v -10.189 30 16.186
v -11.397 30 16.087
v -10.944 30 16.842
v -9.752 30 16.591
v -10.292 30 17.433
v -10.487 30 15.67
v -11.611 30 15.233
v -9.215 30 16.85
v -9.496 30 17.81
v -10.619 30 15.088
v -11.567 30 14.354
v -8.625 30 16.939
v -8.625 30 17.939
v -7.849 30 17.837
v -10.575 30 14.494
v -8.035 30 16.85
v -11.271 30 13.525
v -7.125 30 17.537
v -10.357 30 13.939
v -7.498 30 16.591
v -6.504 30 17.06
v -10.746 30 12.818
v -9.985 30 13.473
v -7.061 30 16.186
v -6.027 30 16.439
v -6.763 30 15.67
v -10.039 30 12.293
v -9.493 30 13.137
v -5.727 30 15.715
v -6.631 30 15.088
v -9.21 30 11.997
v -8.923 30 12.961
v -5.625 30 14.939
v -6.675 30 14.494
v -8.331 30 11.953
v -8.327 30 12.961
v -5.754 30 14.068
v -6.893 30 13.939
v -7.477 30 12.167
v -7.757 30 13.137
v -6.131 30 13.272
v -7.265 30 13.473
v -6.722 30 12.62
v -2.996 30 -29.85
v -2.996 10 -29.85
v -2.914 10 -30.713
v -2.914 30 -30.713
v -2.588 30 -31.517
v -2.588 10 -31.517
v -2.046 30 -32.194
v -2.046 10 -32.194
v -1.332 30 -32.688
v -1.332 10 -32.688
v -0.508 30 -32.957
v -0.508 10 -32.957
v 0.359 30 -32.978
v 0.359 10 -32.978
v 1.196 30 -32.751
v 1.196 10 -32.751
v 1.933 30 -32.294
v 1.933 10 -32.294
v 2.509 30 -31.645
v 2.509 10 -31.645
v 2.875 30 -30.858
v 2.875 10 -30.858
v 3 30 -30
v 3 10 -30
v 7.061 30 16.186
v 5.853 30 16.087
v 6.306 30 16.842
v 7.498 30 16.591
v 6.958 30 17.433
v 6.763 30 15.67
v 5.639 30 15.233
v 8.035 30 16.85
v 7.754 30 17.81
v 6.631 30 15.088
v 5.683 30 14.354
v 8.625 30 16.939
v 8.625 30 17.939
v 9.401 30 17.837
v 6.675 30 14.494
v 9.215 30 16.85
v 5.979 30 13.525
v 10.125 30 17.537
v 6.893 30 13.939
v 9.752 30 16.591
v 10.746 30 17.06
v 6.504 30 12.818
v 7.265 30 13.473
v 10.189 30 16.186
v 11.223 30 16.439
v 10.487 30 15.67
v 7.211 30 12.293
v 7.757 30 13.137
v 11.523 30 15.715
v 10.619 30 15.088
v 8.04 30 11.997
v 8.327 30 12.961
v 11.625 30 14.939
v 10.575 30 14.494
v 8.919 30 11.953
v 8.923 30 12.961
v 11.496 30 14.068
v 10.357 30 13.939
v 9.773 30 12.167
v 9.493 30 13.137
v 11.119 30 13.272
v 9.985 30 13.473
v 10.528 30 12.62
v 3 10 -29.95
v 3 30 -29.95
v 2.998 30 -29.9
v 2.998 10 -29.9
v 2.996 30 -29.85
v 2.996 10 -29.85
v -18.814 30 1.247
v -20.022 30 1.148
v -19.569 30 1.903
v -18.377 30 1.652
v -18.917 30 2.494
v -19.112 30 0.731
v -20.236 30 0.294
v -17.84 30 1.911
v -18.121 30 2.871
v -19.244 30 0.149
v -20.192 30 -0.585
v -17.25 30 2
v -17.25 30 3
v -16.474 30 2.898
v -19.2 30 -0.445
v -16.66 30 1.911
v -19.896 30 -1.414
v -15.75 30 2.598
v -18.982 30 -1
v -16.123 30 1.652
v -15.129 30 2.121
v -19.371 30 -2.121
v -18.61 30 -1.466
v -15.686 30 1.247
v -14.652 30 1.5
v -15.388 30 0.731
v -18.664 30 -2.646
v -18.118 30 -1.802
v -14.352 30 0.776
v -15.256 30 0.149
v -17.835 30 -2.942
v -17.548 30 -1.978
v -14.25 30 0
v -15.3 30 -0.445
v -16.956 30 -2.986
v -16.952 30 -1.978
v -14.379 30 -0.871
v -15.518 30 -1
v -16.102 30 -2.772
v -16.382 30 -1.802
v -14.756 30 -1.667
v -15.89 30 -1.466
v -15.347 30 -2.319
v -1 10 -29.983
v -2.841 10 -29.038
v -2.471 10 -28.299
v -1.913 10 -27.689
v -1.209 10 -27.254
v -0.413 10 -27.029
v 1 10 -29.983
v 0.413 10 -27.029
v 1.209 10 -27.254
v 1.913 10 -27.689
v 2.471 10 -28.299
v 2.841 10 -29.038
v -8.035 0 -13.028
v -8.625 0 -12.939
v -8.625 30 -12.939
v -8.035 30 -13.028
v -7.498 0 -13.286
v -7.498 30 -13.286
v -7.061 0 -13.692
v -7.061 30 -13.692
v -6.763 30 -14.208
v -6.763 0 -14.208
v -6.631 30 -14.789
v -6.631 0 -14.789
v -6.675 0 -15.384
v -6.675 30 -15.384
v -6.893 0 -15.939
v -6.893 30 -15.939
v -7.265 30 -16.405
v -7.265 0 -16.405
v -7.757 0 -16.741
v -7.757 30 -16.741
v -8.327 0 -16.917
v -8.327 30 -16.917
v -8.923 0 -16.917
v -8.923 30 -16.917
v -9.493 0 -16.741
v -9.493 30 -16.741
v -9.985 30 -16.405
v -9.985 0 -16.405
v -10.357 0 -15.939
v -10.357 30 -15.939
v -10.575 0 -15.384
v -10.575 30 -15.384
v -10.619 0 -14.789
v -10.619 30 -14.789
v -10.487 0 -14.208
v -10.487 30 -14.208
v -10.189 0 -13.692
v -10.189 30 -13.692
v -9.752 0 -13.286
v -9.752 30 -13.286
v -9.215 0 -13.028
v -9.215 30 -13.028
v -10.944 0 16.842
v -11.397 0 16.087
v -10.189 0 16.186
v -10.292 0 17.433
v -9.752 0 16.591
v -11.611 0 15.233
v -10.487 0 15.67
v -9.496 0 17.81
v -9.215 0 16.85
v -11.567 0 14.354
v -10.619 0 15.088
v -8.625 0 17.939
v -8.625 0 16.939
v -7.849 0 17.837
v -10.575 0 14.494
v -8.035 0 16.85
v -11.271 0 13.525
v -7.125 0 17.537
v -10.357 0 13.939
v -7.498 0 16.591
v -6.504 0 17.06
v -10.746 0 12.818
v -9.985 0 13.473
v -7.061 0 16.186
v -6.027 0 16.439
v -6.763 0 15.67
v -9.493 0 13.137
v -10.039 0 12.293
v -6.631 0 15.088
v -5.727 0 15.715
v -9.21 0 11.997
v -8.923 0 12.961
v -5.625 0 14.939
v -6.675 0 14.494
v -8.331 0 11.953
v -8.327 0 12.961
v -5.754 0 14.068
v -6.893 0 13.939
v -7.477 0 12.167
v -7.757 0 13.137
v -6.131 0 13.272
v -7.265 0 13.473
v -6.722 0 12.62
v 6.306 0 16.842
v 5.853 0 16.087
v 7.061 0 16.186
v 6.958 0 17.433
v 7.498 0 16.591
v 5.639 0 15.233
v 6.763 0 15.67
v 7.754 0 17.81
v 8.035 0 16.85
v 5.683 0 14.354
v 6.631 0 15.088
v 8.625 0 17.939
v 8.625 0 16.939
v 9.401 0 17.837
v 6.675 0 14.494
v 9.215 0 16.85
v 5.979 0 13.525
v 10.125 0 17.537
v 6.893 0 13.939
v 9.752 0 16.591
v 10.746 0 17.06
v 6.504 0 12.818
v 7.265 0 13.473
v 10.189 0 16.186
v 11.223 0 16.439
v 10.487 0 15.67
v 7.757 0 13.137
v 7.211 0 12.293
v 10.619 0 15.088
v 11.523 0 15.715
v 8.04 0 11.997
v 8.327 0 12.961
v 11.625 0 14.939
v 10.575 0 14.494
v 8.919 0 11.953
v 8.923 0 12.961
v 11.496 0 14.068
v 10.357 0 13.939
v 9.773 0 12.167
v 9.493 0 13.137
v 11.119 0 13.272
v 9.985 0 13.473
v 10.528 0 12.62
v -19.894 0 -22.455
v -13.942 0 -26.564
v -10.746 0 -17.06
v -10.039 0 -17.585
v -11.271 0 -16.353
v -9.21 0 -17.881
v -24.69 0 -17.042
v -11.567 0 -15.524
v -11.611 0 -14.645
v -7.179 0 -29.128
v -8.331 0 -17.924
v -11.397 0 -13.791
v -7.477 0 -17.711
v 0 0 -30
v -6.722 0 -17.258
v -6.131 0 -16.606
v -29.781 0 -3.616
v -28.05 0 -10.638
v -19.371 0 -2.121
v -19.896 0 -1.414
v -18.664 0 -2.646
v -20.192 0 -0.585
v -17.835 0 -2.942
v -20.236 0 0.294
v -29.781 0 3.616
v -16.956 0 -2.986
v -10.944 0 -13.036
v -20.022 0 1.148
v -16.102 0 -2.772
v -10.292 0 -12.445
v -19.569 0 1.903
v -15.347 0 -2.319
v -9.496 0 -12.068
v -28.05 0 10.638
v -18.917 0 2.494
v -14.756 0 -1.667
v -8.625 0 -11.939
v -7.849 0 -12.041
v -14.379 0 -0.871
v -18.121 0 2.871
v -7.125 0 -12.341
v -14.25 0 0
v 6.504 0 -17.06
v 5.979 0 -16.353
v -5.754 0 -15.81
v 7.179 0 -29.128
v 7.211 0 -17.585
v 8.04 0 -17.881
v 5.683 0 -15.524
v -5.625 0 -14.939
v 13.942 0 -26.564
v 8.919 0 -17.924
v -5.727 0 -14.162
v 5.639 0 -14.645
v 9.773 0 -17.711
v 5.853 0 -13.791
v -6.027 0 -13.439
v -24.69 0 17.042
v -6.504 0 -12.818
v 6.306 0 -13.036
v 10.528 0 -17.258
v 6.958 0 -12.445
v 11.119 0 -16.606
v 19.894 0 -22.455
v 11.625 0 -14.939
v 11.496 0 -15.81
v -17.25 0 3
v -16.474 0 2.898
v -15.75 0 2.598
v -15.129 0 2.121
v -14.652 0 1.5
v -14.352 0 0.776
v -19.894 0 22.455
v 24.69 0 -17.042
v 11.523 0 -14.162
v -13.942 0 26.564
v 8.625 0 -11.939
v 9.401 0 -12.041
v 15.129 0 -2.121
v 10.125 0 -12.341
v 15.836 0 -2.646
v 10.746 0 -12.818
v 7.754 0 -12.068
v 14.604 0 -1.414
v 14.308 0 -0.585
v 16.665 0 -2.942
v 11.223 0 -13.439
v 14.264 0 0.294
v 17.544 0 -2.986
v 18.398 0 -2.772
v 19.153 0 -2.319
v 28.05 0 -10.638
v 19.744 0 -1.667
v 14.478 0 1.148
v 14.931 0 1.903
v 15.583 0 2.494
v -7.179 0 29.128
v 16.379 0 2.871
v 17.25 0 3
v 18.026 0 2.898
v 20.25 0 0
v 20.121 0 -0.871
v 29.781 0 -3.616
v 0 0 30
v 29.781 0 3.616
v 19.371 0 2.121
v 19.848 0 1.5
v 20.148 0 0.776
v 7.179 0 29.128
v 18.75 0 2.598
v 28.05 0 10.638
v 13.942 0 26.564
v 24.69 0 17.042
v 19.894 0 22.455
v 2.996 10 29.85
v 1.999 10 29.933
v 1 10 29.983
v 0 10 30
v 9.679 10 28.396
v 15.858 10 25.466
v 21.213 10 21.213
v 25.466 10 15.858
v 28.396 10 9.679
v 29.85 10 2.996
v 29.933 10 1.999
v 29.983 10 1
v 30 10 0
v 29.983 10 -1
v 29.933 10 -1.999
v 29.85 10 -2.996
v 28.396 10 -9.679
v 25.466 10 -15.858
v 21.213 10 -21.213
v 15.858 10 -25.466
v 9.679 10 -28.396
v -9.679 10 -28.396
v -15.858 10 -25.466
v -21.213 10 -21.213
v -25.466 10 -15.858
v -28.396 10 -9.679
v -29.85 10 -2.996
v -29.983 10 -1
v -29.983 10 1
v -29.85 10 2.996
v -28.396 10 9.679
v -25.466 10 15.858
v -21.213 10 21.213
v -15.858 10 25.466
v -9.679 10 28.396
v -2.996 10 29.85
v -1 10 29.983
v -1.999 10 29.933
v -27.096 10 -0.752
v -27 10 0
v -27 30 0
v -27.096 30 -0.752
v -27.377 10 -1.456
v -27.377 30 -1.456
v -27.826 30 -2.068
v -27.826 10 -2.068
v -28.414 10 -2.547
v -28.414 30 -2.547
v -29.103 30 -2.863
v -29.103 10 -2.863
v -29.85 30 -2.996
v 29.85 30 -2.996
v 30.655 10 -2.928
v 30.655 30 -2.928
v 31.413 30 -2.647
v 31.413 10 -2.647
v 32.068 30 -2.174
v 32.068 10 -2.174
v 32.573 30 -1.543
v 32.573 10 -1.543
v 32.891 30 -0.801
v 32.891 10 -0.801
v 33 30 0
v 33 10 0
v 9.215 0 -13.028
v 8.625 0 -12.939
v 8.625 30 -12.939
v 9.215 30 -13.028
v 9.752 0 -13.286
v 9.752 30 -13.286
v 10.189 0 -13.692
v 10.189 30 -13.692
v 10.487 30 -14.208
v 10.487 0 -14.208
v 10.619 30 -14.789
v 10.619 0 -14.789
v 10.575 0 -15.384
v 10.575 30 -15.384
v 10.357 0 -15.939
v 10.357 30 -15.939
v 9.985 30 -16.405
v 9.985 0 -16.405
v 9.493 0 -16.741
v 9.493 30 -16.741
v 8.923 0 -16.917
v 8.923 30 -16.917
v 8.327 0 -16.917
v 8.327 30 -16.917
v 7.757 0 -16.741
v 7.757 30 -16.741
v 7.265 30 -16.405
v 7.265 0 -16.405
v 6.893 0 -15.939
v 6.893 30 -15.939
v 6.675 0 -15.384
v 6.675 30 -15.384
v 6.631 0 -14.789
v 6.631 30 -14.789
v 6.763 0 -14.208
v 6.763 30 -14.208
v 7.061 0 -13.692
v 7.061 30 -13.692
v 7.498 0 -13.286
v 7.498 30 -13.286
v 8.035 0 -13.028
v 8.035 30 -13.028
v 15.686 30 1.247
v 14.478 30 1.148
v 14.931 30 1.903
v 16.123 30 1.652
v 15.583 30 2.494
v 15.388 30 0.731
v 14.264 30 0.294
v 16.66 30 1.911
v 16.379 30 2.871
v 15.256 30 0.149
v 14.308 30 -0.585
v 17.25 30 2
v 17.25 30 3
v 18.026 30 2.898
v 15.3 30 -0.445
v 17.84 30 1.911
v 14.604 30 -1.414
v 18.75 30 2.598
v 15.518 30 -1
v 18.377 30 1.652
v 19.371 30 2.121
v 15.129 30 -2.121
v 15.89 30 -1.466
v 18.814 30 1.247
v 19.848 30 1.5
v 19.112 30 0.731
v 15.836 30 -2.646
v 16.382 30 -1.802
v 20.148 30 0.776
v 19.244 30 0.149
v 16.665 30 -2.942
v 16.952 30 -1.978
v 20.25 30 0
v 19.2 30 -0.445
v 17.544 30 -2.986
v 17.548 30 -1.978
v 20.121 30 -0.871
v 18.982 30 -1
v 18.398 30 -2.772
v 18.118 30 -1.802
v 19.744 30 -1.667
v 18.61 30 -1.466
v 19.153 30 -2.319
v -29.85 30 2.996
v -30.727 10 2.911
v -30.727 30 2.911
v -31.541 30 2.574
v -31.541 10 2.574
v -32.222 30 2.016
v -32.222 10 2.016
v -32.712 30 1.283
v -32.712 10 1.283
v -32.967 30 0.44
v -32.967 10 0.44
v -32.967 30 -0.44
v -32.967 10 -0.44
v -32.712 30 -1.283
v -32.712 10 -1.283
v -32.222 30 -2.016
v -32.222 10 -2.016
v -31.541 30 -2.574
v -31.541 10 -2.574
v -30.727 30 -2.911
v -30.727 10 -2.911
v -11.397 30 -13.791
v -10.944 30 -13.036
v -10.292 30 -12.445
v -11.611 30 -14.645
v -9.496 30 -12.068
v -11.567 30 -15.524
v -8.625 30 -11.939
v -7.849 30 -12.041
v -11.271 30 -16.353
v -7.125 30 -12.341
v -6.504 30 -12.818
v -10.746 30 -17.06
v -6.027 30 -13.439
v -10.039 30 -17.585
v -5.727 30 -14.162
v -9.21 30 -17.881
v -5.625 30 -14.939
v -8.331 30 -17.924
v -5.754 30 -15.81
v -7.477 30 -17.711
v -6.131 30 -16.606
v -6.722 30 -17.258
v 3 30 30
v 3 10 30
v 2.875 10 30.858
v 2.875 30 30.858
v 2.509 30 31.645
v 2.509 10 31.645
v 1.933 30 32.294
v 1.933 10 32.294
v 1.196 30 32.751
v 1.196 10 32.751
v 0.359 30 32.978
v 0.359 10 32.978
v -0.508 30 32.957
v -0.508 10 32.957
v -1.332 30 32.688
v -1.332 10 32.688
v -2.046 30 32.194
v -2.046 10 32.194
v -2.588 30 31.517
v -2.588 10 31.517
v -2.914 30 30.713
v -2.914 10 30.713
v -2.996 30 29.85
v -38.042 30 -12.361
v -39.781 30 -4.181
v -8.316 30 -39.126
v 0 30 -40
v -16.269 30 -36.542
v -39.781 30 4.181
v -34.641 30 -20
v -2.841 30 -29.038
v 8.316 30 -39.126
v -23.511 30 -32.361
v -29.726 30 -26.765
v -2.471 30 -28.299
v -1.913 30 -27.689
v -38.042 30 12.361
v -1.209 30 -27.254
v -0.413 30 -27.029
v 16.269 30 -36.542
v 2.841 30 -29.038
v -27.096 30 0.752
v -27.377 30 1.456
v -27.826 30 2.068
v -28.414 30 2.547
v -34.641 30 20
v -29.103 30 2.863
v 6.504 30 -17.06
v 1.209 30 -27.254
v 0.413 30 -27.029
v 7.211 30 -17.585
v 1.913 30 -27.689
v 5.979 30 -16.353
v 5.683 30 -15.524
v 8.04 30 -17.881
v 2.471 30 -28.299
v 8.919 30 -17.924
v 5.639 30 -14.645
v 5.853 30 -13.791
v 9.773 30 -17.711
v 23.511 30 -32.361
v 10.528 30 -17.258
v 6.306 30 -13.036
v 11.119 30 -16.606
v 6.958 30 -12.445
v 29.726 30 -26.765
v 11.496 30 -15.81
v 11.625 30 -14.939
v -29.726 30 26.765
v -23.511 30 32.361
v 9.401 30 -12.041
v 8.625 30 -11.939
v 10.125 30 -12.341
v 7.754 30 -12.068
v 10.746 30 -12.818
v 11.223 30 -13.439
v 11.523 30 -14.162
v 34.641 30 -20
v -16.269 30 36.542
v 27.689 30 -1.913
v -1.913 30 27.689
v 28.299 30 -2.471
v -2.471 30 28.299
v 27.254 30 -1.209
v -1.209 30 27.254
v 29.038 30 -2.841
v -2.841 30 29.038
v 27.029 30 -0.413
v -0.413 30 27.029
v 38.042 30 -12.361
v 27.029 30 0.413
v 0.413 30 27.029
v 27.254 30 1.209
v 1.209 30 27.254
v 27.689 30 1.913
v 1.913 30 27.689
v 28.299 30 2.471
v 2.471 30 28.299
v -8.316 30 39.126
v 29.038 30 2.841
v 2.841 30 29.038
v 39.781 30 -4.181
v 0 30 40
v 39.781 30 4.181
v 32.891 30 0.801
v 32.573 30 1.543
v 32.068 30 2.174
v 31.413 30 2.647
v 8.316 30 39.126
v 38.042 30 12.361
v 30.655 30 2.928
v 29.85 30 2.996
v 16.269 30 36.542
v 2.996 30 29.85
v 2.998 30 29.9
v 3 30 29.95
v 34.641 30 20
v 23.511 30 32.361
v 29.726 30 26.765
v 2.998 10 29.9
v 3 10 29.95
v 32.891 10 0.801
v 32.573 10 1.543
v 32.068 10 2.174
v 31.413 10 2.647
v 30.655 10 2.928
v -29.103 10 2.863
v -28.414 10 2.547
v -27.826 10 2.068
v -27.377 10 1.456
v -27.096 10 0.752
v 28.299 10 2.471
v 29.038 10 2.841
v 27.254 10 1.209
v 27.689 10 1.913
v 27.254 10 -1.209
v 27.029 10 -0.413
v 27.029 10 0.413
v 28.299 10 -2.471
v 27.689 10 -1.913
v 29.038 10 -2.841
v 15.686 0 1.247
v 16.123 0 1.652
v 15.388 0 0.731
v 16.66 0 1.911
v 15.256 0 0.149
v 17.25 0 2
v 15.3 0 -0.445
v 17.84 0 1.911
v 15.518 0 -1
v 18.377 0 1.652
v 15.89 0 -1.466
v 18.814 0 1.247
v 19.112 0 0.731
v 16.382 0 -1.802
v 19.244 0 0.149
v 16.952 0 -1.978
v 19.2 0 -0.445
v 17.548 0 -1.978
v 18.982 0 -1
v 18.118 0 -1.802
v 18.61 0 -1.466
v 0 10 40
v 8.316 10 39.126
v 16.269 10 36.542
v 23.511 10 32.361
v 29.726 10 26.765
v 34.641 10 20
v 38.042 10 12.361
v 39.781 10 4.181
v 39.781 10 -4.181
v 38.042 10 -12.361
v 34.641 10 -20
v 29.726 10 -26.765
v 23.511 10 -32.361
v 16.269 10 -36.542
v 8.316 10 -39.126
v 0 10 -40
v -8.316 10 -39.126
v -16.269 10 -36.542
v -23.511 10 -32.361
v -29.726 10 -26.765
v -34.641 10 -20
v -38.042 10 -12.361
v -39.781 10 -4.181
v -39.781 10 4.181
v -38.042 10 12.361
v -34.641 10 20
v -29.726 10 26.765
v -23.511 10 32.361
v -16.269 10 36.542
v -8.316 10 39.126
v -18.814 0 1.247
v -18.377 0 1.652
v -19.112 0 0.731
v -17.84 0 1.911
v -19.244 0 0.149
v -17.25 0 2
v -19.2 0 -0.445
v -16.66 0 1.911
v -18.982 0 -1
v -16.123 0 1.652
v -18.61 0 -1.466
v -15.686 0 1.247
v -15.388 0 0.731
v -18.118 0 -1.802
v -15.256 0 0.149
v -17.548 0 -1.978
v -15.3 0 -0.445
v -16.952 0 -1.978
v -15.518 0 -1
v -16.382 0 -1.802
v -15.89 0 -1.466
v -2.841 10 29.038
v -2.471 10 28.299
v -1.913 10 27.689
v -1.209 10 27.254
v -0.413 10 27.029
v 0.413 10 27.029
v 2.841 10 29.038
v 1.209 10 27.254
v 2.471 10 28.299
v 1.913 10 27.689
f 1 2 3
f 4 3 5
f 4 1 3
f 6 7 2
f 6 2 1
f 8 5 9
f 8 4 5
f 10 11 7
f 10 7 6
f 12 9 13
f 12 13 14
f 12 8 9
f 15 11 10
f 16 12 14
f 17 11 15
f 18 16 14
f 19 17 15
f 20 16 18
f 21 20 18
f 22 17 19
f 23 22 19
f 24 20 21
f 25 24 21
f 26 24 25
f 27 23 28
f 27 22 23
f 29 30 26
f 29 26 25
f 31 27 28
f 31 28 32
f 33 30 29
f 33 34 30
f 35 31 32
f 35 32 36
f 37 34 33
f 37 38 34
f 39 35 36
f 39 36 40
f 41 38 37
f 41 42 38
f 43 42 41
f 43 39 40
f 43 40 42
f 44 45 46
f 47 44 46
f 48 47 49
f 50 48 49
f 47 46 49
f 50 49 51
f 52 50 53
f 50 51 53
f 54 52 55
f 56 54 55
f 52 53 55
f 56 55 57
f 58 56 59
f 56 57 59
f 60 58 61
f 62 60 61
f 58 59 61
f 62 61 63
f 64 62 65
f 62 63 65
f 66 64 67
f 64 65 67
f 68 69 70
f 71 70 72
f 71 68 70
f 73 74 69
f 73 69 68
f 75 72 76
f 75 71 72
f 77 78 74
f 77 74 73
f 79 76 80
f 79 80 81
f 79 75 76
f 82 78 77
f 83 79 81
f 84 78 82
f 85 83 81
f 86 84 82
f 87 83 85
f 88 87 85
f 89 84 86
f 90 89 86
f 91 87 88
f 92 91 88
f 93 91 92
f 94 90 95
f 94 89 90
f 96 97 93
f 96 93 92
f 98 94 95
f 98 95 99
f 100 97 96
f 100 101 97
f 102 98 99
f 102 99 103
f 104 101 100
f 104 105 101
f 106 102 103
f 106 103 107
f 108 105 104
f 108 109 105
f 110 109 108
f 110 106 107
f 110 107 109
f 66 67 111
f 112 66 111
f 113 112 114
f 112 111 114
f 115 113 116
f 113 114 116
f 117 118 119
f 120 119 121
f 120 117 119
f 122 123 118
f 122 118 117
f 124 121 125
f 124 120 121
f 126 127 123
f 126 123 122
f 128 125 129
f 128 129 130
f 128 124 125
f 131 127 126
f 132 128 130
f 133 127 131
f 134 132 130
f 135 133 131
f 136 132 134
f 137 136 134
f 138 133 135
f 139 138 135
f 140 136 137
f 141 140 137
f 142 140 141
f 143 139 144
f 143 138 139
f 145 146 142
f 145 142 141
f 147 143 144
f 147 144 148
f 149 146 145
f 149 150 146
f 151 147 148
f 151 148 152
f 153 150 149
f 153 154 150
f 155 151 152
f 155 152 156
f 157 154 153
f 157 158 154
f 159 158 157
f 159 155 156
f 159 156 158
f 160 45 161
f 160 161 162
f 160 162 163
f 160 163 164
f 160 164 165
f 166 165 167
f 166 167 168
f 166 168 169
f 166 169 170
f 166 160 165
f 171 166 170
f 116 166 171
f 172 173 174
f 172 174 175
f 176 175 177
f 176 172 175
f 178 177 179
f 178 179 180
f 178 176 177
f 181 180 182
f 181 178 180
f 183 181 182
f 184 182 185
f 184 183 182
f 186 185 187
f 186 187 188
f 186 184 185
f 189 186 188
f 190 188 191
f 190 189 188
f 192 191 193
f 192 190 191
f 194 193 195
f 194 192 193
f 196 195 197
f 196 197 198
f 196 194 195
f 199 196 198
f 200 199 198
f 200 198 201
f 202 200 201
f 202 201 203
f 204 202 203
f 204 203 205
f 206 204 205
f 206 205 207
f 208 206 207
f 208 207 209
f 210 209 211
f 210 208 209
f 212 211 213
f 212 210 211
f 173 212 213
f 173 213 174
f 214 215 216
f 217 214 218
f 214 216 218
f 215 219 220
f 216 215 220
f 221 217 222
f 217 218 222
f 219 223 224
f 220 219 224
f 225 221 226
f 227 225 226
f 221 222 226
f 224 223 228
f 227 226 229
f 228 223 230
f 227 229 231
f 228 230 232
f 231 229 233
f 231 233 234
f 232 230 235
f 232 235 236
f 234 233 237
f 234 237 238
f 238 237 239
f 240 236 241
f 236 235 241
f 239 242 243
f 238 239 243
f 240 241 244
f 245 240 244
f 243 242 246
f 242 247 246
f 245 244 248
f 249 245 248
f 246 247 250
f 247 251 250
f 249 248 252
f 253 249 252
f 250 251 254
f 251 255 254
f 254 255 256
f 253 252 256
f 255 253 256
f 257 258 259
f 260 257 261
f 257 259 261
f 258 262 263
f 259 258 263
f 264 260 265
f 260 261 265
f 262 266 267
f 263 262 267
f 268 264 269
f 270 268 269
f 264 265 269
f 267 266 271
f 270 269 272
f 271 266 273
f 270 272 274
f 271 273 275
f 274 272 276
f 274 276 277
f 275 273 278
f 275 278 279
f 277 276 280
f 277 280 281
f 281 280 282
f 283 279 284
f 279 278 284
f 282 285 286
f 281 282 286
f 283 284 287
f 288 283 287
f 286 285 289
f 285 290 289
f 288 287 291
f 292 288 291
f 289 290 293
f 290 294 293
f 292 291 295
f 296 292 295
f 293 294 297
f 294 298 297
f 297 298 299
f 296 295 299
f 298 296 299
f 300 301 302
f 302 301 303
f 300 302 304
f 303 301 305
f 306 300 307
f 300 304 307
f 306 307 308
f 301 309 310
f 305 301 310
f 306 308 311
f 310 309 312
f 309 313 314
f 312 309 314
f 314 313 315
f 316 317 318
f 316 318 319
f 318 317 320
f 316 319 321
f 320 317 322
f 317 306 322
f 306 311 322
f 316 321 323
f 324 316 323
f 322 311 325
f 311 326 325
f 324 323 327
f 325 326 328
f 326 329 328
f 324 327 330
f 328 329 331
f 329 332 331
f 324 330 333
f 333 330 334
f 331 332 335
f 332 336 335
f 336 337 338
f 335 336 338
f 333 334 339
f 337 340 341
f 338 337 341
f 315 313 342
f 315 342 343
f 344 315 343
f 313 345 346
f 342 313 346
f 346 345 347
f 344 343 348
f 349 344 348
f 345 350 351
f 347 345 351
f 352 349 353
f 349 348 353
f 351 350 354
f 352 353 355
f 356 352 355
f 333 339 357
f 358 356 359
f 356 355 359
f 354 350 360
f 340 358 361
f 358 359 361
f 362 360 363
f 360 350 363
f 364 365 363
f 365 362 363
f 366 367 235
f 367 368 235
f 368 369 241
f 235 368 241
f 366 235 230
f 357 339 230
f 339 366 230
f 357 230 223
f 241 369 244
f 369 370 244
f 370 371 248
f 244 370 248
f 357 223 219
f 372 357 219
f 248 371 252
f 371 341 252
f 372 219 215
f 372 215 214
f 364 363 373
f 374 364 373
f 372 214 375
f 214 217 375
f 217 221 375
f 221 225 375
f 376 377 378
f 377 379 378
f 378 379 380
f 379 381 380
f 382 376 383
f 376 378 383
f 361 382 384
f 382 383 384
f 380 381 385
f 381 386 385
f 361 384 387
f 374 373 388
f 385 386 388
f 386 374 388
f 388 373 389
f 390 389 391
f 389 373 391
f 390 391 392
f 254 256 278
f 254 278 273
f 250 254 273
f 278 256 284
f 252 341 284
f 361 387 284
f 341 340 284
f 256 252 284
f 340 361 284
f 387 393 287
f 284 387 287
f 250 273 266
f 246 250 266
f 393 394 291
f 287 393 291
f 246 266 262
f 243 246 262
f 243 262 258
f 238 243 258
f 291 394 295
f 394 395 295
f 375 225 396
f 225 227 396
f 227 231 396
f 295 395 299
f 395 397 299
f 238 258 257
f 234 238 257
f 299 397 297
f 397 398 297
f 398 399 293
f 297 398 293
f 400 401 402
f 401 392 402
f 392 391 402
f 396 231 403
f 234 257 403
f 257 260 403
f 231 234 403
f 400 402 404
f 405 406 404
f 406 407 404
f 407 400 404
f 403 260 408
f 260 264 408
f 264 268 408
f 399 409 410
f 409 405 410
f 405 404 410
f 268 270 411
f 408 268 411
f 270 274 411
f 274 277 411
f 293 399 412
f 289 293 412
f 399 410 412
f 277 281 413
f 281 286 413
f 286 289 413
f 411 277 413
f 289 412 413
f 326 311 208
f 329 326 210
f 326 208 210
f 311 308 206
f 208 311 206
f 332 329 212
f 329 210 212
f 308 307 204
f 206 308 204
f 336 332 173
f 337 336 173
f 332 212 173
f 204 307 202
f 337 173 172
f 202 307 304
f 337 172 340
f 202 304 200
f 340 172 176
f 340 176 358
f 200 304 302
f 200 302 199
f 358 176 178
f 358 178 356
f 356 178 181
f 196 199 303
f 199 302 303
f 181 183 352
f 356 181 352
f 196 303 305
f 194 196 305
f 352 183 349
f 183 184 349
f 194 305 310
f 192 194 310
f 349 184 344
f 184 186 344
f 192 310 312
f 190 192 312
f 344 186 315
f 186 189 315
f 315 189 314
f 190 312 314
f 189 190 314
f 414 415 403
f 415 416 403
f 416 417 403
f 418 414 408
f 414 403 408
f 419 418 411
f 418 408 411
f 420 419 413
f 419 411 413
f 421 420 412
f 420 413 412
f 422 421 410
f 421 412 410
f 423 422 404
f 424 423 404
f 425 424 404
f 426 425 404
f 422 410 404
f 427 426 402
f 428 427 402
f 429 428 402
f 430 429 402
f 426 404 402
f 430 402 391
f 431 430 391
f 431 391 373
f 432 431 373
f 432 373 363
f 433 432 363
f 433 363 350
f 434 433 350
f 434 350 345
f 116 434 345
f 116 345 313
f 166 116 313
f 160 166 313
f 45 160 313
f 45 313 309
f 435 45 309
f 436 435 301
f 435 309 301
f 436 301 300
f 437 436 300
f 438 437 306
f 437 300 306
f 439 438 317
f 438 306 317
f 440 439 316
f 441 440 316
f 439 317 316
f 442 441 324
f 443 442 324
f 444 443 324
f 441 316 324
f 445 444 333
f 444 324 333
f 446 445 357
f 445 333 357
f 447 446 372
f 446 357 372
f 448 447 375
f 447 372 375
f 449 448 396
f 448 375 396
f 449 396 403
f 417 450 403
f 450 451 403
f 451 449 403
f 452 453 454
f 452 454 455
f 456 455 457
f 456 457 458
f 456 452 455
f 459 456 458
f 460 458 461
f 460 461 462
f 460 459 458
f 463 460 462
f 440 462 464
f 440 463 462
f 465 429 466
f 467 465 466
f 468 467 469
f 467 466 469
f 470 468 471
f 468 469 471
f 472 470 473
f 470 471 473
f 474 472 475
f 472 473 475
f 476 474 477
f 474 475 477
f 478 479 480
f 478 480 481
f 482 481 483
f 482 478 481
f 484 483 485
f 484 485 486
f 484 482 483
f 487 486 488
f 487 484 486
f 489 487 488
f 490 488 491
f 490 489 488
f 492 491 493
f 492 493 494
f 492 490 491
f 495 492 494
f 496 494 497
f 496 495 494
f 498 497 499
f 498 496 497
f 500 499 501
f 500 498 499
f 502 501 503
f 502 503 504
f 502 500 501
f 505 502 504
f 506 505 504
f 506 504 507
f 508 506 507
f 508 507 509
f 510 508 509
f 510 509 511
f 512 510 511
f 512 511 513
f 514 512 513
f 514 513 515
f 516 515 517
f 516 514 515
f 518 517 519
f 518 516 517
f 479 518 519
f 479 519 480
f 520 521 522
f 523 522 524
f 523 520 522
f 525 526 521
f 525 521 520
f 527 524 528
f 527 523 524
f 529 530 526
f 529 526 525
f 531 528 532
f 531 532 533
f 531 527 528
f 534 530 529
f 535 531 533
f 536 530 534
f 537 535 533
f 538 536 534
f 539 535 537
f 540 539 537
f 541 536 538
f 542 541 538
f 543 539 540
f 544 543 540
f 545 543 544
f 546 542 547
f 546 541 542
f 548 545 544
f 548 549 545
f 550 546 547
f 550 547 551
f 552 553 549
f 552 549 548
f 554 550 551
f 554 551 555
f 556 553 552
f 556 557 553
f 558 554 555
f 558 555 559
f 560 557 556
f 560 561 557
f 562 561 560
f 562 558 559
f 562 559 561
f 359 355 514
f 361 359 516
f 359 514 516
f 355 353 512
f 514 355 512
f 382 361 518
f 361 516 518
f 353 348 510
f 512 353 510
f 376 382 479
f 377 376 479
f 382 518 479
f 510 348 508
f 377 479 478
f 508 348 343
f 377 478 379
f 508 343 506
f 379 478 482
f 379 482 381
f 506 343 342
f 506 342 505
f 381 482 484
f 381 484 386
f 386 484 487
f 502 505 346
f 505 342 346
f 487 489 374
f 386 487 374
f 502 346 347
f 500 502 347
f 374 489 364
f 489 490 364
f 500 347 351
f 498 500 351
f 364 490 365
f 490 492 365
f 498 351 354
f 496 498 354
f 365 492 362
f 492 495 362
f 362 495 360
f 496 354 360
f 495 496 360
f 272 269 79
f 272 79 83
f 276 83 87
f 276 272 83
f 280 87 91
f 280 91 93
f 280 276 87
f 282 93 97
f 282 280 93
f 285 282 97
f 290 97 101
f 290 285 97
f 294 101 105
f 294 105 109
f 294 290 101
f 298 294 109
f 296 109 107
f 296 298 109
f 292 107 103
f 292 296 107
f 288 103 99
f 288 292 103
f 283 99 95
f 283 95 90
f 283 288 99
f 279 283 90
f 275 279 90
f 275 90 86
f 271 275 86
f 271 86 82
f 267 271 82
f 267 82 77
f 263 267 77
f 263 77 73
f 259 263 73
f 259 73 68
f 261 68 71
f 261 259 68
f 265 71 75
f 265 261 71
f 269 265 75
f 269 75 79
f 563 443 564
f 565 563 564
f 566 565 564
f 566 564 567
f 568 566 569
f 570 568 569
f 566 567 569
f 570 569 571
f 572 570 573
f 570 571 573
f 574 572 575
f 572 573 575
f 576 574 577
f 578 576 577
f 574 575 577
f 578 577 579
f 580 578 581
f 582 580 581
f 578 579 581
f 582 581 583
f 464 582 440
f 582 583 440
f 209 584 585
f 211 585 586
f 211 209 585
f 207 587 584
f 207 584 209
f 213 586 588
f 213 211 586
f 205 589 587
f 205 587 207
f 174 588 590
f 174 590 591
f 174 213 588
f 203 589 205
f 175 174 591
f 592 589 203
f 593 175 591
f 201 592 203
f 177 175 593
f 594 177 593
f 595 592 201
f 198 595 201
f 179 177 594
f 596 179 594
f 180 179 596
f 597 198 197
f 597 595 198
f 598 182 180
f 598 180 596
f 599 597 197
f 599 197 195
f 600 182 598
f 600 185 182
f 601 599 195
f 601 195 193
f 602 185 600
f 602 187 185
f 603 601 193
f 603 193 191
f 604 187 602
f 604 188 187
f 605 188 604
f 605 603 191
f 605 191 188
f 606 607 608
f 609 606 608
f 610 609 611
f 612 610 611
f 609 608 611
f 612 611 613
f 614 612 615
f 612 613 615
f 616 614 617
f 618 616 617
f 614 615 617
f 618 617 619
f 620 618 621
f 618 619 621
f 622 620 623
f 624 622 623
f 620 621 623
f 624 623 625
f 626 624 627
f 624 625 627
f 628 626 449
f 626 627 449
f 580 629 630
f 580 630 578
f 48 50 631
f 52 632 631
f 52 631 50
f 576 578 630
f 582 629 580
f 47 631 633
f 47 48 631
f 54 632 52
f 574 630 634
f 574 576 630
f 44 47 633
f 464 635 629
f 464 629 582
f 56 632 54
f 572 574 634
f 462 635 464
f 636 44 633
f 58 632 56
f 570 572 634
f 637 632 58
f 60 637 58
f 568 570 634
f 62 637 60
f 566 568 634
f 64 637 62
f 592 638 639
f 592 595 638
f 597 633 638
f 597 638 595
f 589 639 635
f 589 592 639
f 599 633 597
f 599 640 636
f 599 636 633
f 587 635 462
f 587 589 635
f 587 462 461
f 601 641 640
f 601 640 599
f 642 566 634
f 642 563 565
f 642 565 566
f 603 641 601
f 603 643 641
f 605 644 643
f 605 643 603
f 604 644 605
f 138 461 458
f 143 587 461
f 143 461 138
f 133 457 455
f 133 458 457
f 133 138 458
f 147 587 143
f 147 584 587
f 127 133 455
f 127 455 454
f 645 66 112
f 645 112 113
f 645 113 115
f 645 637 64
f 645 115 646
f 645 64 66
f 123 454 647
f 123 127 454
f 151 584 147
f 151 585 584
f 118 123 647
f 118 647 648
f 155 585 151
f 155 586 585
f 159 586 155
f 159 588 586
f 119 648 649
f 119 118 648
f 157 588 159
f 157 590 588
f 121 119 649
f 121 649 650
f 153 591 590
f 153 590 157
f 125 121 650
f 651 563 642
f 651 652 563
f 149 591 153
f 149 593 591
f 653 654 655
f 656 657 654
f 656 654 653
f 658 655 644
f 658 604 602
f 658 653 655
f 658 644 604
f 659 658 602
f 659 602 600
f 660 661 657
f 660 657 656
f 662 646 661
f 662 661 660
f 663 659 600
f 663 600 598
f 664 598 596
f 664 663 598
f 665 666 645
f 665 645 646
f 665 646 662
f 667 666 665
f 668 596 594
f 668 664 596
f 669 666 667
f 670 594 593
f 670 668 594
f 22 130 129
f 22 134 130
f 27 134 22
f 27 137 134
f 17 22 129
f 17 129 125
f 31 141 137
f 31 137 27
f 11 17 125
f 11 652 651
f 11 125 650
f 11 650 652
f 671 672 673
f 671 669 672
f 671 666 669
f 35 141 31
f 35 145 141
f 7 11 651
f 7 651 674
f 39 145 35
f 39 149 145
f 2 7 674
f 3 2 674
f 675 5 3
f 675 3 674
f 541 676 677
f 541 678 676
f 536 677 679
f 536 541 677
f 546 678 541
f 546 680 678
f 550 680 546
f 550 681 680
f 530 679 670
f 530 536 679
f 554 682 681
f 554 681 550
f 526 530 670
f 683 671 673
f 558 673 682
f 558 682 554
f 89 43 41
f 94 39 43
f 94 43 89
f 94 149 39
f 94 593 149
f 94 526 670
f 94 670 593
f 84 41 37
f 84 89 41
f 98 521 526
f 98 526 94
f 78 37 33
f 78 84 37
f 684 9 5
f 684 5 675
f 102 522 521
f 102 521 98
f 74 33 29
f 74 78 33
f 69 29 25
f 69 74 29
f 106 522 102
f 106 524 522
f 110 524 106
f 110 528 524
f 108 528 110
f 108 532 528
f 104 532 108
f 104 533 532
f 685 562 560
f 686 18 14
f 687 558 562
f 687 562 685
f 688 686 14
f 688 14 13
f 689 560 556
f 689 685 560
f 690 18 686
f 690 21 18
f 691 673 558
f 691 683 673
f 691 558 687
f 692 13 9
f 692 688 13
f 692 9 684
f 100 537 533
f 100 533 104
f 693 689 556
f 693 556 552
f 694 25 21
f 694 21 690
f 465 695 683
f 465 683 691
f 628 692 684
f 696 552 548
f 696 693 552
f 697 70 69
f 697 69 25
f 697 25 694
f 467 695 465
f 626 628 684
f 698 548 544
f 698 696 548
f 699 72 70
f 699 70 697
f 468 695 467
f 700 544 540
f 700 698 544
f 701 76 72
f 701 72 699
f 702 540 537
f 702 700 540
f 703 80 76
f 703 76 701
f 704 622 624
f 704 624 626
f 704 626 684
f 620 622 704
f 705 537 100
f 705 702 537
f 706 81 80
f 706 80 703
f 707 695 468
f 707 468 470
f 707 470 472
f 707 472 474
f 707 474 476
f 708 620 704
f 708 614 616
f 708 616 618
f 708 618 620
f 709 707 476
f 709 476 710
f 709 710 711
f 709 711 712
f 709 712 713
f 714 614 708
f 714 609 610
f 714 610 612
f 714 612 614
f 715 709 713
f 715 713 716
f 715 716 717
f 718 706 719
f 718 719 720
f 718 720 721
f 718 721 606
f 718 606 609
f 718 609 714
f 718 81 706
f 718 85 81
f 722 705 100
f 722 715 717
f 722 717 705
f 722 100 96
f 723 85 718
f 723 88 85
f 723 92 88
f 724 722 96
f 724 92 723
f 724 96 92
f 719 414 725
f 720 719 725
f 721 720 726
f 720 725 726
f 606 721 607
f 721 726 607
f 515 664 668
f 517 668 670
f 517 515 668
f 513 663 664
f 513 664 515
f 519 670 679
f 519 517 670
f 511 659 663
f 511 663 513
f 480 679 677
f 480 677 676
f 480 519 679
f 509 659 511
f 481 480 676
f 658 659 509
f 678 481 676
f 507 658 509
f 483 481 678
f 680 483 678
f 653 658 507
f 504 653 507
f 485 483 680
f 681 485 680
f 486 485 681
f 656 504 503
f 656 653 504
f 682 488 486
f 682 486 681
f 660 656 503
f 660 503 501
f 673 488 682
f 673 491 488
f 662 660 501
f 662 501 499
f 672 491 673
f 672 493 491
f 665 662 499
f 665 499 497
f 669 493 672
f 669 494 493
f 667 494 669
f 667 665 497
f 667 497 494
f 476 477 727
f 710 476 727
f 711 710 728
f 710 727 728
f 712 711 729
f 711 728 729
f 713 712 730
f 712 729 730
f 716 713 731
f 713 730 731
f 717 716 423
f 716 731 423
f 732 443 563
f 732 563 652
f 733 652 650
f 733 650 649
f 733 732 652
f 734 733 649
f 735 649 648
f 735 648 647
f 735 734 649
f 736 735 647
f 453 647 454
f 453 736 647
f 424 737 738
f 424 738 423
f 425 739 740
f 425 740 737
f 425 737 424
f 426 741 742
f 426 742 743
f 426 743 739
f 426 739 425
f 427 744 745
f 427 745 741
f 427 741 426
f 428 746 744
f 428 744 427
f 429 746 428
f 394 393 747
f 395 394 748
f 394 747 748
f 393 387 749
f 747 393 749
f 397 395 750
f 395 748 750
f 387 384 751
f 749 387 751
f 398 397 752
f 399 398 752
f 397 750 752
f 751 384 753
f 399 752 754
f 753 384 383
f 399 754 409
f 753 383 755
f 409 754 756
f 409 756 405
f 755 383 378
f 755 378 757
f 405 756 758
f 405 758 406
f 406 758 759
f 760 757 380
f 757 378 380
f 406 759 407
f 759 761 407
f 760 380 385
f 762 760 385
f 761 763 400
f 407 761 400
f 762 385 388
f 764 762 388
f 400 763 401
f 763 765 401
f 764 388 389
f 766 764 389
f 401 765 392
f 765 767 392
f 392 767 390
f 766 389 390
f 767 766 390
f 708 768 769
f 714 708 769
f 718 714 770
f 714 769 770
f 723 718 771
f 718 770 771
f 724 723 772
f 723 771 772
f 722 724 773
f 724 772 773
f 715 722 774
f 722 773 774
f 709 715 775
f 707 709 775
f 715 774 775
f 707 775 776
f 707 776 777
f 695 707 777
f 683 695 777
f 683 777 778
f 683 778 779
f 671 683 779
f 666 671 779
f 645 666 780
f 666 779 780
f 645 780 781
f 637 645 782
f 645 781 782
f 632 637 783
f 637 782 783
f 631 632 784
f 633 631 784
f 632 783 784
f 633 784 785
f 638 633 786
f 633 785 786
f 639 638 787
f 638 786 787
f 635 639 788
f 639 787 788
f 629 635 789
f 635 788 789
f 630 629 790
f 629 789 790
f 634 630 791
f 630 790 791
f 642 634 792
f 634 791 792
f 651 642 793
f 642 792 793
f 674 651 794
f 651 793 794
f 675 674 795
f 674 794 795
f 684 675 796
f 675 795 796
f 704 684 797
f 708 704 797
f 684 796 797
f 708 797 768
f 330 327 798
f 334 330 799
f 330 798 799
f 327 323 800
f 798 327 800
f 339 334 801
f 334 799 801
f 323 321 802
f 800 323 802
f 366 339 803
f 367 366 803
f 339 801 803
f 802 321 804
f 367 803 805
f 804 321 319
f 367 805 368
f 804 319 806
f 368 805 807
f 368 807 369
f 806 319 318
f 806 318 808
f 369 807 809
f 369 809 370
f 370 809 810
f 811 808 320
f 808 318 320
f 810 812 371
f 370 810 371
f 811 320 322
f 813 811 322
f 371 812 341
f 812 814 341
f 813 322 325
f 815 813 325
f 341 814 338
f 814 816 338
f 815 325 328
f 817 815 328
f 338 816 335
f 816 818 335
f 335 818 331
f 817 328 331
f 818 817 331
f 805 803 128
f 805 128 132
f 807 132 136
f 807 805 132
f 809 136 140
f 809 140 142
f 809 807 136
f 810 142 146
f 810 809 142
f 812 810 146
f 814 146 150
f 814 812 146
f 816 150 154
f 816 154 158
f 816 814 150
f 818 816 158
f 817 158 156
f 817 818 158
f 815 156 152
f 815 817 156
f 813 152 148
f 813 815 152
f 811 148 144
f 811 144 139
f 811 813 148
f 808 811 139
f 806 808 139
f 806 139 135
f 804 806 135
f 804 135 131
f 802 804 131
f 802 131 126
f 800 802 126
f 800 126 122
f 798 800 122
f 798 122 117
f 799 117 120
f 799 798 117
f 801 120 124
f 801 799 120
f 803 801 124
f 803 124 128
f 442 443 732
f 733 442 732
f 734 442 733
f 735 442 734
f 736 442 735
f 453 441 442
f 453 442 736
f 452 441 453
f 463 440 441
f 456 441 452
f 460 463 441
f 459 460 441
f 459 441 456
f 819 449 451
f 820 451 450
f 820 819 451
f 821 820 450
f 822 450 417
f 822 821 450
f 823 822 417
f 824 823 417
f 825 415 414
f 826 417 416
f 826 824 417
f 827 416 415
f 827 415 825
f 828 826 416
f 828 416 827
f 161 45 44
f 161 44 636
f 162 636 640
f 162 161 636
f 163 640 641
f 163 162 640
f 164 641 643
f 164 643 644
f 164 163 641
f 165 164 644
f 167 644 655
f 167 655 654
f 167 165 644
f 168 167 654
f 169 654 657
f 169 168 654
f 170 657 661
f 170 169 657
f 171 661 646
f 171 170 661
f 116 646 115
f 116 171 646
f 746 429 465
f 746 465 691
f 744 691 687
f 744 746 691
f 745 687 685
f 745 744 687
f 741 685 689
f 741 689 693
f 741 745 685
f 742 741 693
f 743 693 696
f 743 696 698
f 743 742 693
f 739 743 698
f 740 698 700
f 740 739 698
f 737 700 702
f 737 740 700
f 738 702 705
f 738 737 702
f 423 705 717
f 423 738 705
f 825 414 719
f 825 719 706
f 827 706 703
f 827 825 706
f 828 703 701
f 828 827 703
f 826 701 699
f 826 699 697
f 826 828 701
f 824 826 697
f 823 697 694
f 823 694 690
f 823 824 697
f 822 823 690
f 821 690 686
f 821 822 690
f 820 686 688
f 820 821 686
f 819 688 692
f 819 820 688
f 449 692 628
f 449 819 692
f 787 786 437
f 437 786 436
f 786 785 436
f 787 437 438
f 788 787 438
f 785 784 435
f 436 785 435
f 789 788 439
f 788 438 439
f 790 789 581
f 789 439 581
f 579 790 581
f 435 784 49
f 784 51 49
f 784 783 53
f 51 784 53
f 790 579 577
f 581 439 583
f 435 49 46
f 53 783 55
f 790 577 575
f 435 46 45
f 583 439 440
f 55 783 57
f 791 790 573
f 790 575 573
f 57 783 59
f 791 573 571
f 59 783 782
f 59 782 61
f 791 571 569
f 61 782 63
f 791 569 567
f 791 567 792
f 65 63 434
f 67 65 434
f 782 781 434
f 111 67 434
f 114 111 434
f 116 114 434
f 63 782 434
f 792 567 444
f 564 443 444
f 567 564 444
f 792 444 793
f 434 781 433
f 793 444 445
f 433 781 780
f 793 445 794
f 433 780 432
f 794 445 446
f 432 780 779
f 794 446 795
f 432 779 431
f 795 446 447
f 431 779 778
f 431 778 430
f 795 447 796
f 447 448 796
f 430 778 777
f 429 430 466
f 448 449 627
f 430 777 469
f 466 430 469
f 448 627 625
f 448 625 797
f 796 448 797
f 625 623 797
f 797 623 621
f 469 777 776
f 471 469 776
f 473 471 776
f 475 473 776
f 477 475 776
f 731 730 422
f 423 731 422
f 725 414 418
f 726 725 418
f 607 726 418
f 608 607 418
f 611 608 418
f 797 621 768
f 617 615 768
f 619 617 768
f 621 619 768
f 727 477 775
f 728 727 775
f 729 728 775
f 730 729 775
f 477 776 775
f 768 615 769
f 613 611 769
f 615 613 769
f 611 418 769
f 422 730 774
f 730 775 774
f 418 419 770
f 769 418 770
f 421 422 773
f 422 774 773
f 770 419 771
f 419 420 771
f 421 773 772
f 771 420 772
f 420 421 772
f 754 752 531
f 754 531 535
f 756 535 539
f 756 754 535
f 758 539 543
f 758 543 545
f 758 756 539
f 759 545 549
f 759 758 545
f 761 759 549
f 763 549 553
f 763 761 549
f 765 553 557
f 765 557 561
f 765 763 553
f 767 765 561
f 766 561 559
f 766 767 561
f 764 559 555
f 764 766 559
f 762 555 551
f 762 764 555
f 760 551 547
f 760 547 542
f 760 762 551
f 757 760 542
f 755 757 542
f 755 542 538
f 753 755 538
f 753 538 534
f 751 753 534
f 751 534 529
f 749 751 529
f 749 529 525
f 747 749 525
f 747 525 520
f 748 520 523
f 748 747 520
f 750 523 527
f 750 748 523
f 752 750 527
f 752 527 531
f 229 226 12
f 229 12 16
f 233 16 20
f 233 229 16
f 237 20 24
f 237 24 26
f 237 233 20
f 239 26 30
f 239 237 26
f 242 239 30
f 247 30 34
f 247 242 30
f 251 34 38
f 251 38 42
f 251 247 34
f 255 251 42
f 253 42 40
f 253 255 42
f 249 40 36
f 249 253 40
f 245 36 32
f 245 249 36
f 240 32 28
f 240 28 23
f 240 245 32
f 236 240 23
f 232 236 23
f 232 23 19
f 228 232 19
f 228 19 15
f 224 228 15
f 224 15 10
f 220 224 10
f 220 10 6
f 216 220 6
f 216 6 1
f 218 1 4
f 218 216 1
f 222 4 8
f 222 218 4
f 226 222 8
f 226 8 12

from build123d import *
from build123d.topology import SkipClean

# Parameters (mm, degrees)
SKETCH_1_R          = 30
SKETCH_1_R_2        = 3
EXTRUDE_1_DEPTH     = 30
EXTRUDE_START       = -20
SKETCH_2_R          = 40
EXTRUDE_2_DEPTH     = 20
CUT_EXTRUDE_START   = -20
CUT_EXTRUDE_1_DEPTH = 20
EXTRUDE_START_2     = -30
SKETCH_4_R          = 3
SKETCH_4_R_2        = 2
EXTRUDE_4_DEPTH     = 30


with BuildPart() as part:
    # 草图1 → 凸台-拉伸1 (new body)
    with BuildSketch(Plane(origin=(0, 0, 0), x_dir=(1, 0, 0), z_dir=(0, 1, 0))):
        with Locations(Location((0, 0, 0), (0, 0, 270))):
            Circle(SKETCH_1_R)
        with Locations(Location((-17.25, 0, 0), (0, 0, 270))):
            Circle(SKETCH_1_R_2, mode=Mode.SUBTRACT)
        with Locations(Location((-8.625, 14.938938215, 0), (0, 0, 270))):
            Circle(SKETCH_1_R_2, mode=Mode.SUBTRACT)
        with Locations(Location((8.625, 14.938938215, 0), (0, 0, 270))):
            Circle(SKETCH_1_R_2, mode=Mode.SUBTRACT)
        with Locations(Location((17.25, 0, 0), (0, 0, 270))):
            Circle(SKETCH_1_R_2, mode=Mode.SUBTRACT)
        with Locations(Location((8.625, -14.938938215, 0), (0, 0, 270))):
            Circle(SKETCH_1_R_2, mode=Mode.SUBTRACT)
        with Locations(Location((-8.625, -14.938938215, 0), (0, 0, 270))):
            Circle(SKETCH_1_R_2, mode=Mode.SUBTRACT)
    extrude(amount=EXTRUDE_1_DEPTH)

    # 草图2 → 凸台-拉伸2 (add)
    with BuildSketch(Plane(origin=(0, 30, 0), x_dir=(1, 0, 0), z_dir=(0, 1, 0)).offset(EXTRUDE_START)):
        with Locations(Location((0, 0, 0), (0, 0, 270))):
            Circle(SKETCH_2_R)
        with BuildLine():
            ThreePointArc((2.996247653, 29.85), (21.213203436, 21.213203436), (29.85, 2.996247653))
            ThreePointArc((29.85, 2.996247653), (32.067607313, 2.173706512), (33, 0))
            ThreePointArc((33, 0), (32.067607313, -2.173706512), (29.85, -2.996247653))
            ThreePointArc((29.85, -2.996247653), (21.213203436, -21.213203436), (2.996247653, -29.85))
            ThreePointArc((2.996247653, -29.85), (2.999061767, -29.924976537), (3, -30))
            ThreePointArc((3, -30), (-0.075023463, -32.999061767), (-2.996247653, -29.85))
            ThreePointArc((-2.996247653, -29.85), (-21.213203436, -21.213203436), (-29.85, -2.996247653))
            ThreePointArc((-29.85, -2.996247653), (-33, 0), (-29.85, 2.996247653))
            ThreePointArc((-29.85, 2.996247653), (-21.213203436, 21.213203436), (-2.996247653, 29.85))
            ThreePointArc((-2.996247653, 29.85), (-0.075023463, 32.999061767), (3, 30))
            ThreePointArc((3, 30), (2.999061767, 29.924976537), (2.996247653, 29.85))
        make_face(mode=Mode.SUBTRACT)
    extrude(amount=EXTRUDE_2_DEPTH)

    # 草图3 → 切除-拉伸1 (cut)
    with SkipClean():  # the faces are left unmerged after this step: merging them gives an invalid solid
        with BuildSketch(Plane(origin=(0, 30, 0), x_dir=(1, 0, 0), z_dir=(0, 1, 0)).offset(CUT_EXTRUDE_START)):
            with BuildLine():
                ThreePointArc((29.85, -2.996247653), (29.962476533, -1.5), (30, 0))
                ThreePointArc((30, 0), (29.962476533, 1.5), (29.85, 2.996247653))
                ThreePointArc((29.85, 2.996247653), (27, 0), (29.85, -2.996247653))
            make_face()
            with BuildLine():
                ThreePointArc((29.85, 2.996247653), (29.962476533, 1.5), (30, 0))
                ThreePointArc((30, 0), (29.962476533, -1.5), (29.85, -2.996247653))
                ThreePointArc((29.85, -2.996247653), (32.067607313, -2.173706512), (33, 0))
                ThreePointArc((33, 0), (32.067607313, 2.173706512), (29.85, 2.996247653))
            make_face()
            with BuildLine():
                ThreePointArc((-2.996247653, 29.85), (0, 27), (2.996247653, 29.85))
                ThreePointArc((2.996247653, 29.85), (0, 30), (-2.996247653, 29.85))
            make_face()
            with BuildLine():
                ThreePointArc((-2.996247653, 29.85), (0, 30), (2.996247653, 29.85))
                ThreePointArc((2.996247653, 29.85), (2.999061767, 29.924976537), (3, 30))
                ThreePointArc((3, 30), (-0.075023463, 32.999061767), (-2.996247653, 29.85))
            make_face()
            with BuildLine():
                ThreePointArc((3, -30), (2.999061767, -29.924976537), (2.996247653, -29.85))
                ThreePointArc((2.996247653, -29.85), (0, -30), (-2.996247653, -29.85))
                ThreePointArc((-2.996247653, -29.85), (-0.075023463, -32.999061767), (3, -30))
            make_face()
            with BuildLine():
                ThreePointArc((-2.996247653, -29.85), (0, -30), (2.996247653, -29.85))
                ThreePointArc((2.996247653, -29.85), (0, -27), (-2.996247653, -29.85))
            make_face()
            with BuildLine():
                ThreePointArc((-27, 0), (-27.826293488, 2.067607313), (-29.85, 2.996247653))
                ThreePointArc((-29.85, 2.996247653), (-30, 0), (-29.85, -2.996247653))
                ThreePointArc((-29.85, -2.996247653), (-27.826293488, -2.067607313), (-27, 0))
            make_face()
            with BuildLine():
                ThreePointArc((-29.85, -2.996247653), (-30, 0), (-29.85, 2.996247653))
                ThreePointArc((-29.85, 2.996247653), (-33, 0), (-29.85, -2.996247653))
            make_face()
        extrude(amount=CUT_EXTRUDE_1_DEPTH, mode=Mode.SUBTRACT)

    # 草图4 → 凸台-拉伸4 (add)
    # profile 1 of 6: a face of its own
    with SkipClean():  # the faces are left unmerged after this step: merging them gives an invalid solid
        with BuildSketch(Plane(origin=(0, 30, 0), x_dir=(1, 0, 0), z_dir=(0, 1, 0)).offset(EXTRUDE_START_2)):
            with Locations((17.25, 0)):
                Circle(SKETCH_4_R)
            with Locations(Location((17.25, 0, 0), (0, 0, 270))):
                Circle(SKETCH_4_R_2, mode=Mode.SUBTRACT)
        # profile 2 of 6: a face of its own
        with BuildSketch(Plane(origin=(0, 30, 0), x_dir=(1, 0, 0), z_dir=(0, 1, 0)).offset(EXTRUDE_START_2)):
            with Locations((8.625, 14.938938215)):
                Circle(SKETCH_4_R)
            with Locations(Location((8.625, 14.938938215, 0), (0, 0, 270))):
                Circle(SKETCH_4_R_2, mode=Mode.SUBTRACT)
        # profile 3 of 6: a face of its own
        with BuildSketch(Plane(origin=(0, 30, 0), x_dir=(1, 0, 0), z_dir=(0, 1, 0)).offset(EXTRUDE_START_2)):
            with Locations((8.625, -14.938938215)):
                Circle(SKETCH_4_R)
            with Locations(Location((8.625, -14.938938215, 0), (0, 0, 270))):
                Circle(SKETCH_4_R_2, mode=Mode.SUBTRACT)
        # profile 4 of 6: a face of its own
        with BuildSketch(Plane(origin=(0, 30, 0), x_dir=(1, 0, 0), z_dir=(0, 1, 0)).offset(EXTRUDE_START_2)):
            with Locations((-8.625, 14.938938215)):
                Circle(SKETCH_4_R)
            with Locations(Location((-8.625, 14.938938215, 0), (0, 0, 270))):
                Circle(SKETCH_4_R_2, mode=Mode.SUBTRACT)
        # profile 5 of 6: a face of its own
        with BuildSketch(Plane(origin=(0, 30, 0), x_dir=(1, 0, 0), z_dir=(0, 1, 0)).offset(EXTRUDE_START_2)):
            with Locations((-8.625, -14.938938215)):
                Circle(SKETCH_4_R)
            with Locations(Location((-8.625, -14.938938215, 0), (0, 0, 270))):
                Circle(SKETCH_4_R_2, mode=Mode.SUBTRACT)
        # profile 6 of 6: a face of its own
        with BuildSketch(Plane(origin=(0, 30, 0), x_dir=(1, 0, 0), z_dir=(0, 1, 0)).offset(EXTRUDE_START_2)):
            with Locations((-17.25, 0)):
                Circle(SKETCH_4_R)
            with Locations(Location((-17.25, 0, 0), (0, 0, 270))):
                Circle(SKETCH_4_R_2, mode=Mode.SUBTRACT)
        extrude(amount=EXTRUDE_4_DEPTH)


solid = part.part
